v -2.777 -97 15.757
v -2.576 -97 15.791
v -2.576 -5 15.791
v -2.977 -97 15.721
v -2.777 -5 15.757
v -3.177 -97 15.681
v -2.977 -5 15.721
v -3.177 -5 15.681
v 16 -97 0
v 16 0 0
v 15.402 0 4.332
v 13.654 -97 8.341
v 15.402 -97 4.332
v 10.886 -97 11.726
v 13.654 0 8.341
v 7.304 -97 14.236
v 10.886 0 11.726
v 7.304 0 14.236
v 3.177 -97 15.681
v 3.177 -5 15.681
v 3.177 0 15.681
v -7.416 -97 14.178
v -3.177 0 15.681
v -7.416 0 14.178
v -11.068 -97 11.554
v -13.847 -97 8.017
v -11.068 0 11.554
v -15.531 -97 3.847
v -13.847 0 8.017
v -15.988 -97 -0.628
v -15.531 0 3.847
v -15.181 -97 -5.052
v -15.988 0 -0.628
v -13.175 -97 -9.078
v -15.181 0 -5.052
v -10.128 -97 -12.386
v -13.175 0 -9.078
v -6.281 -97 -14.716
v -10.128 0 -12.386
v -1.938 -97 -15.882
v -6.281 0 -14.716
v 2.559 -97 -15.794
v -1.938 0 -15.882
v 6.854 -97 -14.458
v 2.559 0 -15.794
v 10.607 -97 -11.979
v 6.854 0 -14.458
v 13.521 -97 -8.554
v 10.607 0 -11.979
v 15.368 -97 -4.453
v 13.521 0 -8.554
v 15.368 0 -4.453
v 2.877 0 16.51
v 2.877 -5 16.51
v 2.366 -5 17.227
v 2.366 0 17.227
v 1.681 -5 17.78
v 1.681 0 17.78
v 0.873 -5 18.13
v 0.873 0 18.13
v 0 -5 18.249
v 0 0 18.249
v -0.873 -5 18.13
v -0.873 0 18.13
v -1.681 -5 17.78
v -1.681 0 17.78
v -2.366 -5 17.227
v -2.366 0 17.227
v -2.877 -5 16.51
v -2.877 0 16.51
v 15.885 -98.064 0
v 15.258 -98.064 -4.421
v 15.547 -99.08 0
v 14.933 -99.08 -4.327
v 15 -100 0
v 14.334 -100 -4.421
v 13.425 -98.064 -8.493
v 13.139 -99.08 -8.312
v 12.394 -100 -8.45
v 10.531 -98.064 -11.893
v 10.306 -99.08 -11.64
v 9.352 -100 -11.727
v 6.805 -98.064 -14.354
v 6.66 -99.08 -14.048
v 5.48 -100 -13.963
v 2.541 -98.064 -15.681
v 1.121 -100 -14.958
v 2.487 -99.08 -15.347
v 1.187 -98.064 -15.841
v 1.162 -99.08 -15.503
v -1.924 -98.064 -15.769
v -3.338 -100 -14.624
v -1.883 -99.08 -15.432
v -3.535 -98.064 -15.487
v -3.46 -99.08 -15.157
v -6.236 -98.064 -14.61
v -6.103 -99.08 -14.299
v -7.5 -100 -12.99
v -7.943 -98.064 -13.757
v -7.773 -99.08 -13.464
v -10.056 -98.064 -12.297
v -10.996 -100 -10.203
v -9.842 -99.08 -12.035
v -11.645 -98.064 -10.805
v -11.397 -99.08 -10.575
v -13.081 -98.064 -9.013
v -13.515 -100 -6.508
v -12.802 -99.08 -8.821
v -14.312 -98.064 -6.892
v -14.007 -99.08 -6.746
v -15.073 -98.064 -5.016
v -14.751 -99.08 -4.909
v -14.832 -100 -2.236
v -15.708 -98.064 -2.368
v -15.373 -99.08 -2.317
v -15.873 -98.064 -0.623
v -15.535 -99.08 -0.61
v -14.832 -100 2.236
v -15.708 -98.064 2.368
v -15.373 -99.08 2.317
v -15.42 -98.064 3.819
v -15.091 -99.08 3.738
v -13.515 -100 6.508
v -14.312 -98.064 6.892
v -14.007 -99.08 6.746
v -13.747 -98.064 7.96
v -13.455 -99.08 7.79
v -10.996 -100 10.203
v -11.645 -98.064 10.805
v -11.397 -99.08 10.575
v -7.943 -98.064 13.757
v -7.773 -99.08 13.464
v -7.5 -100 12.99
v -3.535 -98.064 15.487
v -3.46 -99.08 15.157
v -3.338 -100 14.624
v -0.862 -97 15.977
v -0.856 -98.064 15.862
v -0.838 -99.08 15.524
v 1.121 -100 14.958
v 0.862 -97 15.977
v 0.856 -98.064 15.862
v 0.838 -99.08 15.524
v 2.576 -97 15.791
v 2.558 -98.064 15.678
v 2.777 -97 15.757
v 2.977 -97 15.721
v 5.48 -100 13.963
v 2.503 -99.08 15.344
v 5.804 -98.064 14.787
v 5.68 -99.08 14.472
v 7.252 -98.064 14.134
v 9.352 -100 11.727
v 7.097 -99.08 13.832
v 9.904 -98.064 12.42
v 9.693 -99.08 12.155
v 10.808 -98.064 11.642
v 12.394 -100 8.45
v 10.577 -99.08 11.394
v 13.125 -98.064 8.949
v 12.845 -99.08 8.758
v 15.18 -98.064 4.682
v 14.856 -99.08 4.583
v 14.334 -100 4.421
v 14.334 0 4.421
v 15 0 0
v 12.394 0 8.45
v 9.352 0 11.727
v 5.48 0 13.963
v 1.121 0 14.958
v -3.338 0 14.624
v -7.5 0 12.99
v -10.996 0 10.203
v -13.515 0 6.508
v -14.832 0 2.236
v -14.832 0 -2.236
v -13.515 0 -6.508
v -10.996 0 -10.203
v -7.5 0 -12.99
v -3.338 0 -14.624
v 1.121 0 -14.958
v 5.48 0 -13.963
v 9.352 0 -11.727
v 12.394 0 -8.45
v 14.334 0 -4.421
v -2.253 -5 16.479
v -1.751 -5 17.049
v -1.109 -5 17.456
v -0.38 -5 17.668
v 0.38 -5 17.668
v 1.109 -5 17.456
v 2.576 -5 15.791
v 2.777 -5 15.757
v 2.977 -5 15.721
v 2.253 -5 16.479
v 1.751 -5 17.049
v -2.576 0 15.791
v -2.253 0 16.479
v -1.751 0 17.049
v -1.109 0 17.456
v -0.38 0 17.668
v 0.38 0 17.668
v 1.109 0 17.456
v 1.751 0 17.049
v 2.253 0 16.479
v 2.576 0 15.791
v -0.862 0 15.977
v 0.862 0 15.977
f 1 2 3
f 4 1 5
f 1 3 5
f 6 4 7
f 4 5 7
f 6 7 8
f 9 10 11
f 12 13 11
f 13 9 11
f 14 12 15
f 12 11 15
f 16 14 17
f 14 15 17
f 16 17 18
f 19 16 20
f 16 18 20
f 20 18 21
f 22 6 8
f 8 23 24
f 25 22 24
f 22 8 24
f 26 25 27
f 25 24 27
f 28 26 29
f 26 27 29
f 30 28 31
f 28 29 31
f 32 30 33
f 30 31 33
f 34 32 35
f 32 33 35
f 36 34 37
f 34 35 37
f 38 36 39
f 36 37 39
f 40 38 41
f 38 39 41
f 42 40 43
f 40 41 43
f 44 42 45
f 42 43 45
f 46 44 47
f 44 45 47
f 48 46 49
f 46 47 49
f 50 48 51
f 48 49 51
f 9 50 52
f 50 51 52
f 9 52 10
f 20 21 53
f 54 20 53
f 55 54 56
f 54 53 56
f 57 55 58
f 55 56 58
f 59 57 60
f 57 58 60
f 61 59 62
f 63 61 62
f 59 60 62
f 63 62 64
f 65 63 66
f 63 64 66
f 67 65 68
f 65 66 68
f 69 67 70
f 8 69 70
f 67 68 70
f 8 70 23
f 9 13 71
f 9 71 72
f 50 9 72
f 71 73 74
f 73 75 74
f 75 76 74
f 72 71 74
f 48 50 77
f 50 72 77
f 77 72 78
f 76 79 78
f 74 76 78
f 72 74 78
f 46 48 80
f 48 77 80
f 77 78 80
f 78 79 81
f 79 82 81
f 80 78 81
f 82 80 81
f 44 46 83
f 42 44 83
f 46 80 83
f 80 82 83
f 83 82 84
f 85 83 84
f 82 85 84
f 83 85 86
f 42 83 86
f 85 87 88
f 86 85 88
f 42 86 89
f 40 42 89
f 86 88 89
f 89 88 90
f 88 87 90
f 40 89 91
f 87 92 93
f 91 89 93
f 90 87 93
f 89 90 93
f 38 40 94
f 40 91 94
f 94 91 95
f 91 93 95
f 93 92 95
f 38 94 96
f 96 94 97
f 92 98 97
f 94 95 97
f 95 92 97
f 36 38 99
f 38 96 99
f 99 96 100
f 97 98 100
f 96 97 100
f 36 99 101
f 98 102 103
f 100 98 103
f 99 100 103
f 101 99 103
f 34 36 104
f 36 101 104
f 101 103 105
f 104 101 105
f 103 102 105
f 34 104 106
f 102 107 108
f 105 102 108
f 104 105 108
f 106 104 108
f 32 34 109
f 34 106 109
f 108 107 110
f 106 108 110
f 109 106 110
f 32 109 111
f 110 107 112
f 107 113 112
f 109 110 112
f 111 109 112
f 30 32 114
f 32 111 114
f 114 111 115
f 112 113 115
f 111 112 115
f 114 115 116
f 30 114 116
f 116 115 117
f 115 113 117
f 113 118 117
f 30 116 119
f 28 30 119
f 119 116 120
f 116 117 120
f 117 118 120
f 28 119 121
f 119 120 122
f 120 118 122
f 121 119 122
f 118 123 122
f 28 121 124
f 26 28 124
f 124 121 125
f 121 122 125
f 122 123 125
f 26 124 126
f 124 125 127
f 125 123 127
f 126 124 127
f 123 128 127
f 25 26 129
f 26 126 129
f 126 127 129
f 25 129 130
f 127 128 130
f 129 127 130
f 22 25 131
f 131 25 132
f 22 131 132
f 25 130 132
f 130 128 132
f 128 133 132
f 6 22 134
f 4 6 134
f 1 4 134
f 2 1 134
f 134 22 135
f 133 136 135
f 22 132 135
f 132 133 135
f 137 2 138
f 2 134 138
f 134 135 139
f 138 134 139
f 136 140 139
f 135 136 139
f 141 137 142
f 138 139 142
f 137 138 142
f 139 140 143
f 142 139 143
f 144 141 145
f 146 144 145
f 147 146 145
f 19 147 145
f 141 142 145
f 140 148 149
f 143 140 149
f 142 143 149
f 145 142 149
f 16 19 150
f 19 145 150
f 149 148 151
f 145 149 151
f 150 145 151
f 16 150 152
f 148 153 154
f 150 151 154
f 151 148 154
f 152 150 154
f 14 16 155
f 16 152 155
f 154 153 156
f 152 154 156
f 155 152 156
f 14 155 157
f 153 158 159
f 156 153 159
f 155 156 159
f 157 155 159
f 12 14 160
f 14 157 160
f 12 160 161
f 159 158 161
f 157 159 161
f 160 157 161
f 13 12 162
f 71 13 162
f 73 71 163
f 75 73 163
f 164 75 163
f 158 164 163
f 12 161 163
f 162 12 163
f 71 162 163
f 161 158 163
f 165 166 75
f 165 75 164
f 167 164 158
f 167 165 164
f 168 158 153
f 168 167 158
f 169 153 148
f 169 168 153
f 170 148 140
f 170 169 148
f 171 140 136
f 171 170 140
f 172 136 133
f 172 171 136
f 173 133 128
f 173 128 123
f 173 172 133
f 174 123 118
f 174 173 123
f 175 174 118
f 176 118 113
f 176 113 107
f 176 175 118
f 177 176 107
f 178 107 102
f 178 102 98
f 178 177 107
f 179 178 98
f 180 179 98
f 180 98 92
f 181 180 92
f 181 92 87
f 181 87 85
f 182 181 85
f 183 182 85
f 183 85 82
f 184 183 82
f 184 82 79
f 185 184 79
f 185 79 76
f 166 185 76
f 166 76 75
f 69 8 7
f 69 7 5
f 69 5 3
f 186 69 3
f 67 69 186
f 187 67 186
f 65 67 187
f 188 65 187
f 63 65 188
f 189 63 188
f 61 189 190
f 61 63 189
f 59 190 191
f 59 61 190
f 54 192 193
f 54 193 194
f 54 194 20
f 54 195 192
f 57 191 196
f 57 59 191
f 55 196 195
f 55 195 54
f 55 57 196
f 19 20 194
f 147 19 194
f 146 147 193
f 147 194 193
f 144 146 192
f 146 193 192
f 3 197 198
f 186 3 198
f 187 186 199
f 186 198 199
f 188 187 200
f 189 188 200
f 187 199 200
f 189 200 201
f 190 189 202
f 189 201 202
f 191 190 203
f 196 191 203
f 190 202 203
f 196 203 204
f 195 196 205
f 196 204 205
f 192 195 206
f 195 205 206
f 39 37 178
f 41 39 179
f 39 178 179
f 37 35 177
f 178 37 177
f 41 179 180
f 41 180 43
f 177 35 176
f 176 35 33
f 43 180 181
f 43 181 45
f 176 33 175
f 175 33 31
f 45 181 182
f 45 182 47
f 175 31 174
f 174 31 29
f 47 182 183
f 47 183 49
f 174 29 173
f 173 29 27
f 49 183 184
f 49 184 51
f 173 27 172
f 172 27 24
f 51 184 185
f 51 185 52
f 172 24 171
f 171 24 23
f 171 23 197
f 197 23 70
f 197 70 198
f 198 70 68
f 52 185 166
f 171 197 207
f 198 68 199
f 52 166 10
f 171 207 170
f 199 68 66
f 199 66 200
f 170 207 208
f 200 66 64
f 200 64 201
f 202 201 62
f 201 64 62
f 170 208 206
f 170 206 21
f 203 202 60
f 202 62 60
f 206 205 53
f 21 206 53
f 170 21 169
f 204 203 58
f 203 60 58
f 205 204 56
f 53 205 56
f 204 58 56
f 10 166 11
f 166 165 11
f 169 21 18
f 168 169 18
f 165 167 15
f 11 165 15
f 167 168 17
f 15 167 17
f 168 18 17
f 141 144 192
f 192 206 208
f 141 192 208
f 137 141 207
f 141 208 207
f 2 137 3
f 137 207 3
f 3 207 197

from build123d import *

# Parameters (mm, degrees)
F0_R     = 15
F1_DEPTH = 100
F2_DEPTH = 5


# Not quite as in the source:
# - a fillet or chamfer that OpenCascade refuses, or shapes differently, is made with other operations: its cross-section is extruded or revolved along the edge and cut away or added


with BuildPart() as f1:
    # F0 (on Front) → F1 (new body)
    with BuildSketch(Plane.XZ):
        with BuildLine():
            ThreePointArc((3.1768111268, 15.6814499031), (2.876945892, 15.7392243244), (2.5760326281, 15.7912651773))
            ThreePointArc((2.5760326281, 15.7912651773), (0, 16), (-2.5760326281, 15.7912651773))
            ThreePointArc((-2.5760326281, 15.7912651773), (-2.876945892, 15.7392243244), (-3.1768111268, 15.6814499031))
            ThreePointArc((-3.1768111268, 15.6814499031), (-10.1284505718, -12.3860602701), (16, 0))
            ThreePointArc((16, 0), (12.3860602701, 10.1284505718), (3.1768111268, 15.6814499031))
        make_face()
        Circle(F0_R, mode=Mode.SUBTRACT)
    extrude(amount=F1_DEPTH)

    # F0 (on Front) → F2 (join)
    with BuildSketch(Plane.XZ):
        with BuildLine():
            ThreePointArc((-2.5760326281, 15.7912651773), (0, 17.6948181166), (2.5760326281, 15.7912651773))
            ThreePointArc((2.5760326281, 15.7912651773), (2.876945892, 15.7392243244), (3.1768111268, 15.6814499031))
            ThreePointArc((3.1768111268, 15.6814499031), (0, 18.2490772391), (-3.1768111268, 15.6814499031))
            ThreePointArc((-3.1768111268, 15.6814499031), (-2.876945892, 15.7392243244), (-2.5760326281, 15.7912651773))
        make_face()
        with BuildLine():
            ThreePointArc((3.1768111268, 15.6814499031), (2.876945892, 15.7392243244), (2.5760326281, 15.7912651773))
            ThreePointArc((2.5760326281, 15.7912651773), (0, 16), (-2.5760326281, 15.7912651773))
            ThreePointArc((-2.5760326281, 15.7912651773), (-2.876945892, 15.7392243244), (-3.1768111268, 15.6814499031))
            ThreePointArc((-3.1768111268, 15.6814499031), (-10.1284505718, -12.3860602701), (16, 0))
            ThreePointArc((16, 0), (12.3860602701, 10.1284505718), (3.1768111268, 15.6814499031))
        make_face()
        Circle(F0_R, mode=Mode.SUBTRACT)
    extrude(amount=F2_DEPTH)

    # F3: fillet of radius 5 on 1 edges, made by hand

    # F3_s1 → F3_t2 (revolve, cut)
    with BuildSketch(Plane.XY):
        with BuildLine():
            ThreePointArc((16, -97), (15.7434164903, -98.5811388301), (15, -100))
            Line((15, -100), (16, -100))
            Line((16, -100), (16, -97))
        make_face()
    revolve(axis=Axis((0, -100, 0), (0, 1, 0)), mode=Mode.SUBTRACT)


solid = f1.part
